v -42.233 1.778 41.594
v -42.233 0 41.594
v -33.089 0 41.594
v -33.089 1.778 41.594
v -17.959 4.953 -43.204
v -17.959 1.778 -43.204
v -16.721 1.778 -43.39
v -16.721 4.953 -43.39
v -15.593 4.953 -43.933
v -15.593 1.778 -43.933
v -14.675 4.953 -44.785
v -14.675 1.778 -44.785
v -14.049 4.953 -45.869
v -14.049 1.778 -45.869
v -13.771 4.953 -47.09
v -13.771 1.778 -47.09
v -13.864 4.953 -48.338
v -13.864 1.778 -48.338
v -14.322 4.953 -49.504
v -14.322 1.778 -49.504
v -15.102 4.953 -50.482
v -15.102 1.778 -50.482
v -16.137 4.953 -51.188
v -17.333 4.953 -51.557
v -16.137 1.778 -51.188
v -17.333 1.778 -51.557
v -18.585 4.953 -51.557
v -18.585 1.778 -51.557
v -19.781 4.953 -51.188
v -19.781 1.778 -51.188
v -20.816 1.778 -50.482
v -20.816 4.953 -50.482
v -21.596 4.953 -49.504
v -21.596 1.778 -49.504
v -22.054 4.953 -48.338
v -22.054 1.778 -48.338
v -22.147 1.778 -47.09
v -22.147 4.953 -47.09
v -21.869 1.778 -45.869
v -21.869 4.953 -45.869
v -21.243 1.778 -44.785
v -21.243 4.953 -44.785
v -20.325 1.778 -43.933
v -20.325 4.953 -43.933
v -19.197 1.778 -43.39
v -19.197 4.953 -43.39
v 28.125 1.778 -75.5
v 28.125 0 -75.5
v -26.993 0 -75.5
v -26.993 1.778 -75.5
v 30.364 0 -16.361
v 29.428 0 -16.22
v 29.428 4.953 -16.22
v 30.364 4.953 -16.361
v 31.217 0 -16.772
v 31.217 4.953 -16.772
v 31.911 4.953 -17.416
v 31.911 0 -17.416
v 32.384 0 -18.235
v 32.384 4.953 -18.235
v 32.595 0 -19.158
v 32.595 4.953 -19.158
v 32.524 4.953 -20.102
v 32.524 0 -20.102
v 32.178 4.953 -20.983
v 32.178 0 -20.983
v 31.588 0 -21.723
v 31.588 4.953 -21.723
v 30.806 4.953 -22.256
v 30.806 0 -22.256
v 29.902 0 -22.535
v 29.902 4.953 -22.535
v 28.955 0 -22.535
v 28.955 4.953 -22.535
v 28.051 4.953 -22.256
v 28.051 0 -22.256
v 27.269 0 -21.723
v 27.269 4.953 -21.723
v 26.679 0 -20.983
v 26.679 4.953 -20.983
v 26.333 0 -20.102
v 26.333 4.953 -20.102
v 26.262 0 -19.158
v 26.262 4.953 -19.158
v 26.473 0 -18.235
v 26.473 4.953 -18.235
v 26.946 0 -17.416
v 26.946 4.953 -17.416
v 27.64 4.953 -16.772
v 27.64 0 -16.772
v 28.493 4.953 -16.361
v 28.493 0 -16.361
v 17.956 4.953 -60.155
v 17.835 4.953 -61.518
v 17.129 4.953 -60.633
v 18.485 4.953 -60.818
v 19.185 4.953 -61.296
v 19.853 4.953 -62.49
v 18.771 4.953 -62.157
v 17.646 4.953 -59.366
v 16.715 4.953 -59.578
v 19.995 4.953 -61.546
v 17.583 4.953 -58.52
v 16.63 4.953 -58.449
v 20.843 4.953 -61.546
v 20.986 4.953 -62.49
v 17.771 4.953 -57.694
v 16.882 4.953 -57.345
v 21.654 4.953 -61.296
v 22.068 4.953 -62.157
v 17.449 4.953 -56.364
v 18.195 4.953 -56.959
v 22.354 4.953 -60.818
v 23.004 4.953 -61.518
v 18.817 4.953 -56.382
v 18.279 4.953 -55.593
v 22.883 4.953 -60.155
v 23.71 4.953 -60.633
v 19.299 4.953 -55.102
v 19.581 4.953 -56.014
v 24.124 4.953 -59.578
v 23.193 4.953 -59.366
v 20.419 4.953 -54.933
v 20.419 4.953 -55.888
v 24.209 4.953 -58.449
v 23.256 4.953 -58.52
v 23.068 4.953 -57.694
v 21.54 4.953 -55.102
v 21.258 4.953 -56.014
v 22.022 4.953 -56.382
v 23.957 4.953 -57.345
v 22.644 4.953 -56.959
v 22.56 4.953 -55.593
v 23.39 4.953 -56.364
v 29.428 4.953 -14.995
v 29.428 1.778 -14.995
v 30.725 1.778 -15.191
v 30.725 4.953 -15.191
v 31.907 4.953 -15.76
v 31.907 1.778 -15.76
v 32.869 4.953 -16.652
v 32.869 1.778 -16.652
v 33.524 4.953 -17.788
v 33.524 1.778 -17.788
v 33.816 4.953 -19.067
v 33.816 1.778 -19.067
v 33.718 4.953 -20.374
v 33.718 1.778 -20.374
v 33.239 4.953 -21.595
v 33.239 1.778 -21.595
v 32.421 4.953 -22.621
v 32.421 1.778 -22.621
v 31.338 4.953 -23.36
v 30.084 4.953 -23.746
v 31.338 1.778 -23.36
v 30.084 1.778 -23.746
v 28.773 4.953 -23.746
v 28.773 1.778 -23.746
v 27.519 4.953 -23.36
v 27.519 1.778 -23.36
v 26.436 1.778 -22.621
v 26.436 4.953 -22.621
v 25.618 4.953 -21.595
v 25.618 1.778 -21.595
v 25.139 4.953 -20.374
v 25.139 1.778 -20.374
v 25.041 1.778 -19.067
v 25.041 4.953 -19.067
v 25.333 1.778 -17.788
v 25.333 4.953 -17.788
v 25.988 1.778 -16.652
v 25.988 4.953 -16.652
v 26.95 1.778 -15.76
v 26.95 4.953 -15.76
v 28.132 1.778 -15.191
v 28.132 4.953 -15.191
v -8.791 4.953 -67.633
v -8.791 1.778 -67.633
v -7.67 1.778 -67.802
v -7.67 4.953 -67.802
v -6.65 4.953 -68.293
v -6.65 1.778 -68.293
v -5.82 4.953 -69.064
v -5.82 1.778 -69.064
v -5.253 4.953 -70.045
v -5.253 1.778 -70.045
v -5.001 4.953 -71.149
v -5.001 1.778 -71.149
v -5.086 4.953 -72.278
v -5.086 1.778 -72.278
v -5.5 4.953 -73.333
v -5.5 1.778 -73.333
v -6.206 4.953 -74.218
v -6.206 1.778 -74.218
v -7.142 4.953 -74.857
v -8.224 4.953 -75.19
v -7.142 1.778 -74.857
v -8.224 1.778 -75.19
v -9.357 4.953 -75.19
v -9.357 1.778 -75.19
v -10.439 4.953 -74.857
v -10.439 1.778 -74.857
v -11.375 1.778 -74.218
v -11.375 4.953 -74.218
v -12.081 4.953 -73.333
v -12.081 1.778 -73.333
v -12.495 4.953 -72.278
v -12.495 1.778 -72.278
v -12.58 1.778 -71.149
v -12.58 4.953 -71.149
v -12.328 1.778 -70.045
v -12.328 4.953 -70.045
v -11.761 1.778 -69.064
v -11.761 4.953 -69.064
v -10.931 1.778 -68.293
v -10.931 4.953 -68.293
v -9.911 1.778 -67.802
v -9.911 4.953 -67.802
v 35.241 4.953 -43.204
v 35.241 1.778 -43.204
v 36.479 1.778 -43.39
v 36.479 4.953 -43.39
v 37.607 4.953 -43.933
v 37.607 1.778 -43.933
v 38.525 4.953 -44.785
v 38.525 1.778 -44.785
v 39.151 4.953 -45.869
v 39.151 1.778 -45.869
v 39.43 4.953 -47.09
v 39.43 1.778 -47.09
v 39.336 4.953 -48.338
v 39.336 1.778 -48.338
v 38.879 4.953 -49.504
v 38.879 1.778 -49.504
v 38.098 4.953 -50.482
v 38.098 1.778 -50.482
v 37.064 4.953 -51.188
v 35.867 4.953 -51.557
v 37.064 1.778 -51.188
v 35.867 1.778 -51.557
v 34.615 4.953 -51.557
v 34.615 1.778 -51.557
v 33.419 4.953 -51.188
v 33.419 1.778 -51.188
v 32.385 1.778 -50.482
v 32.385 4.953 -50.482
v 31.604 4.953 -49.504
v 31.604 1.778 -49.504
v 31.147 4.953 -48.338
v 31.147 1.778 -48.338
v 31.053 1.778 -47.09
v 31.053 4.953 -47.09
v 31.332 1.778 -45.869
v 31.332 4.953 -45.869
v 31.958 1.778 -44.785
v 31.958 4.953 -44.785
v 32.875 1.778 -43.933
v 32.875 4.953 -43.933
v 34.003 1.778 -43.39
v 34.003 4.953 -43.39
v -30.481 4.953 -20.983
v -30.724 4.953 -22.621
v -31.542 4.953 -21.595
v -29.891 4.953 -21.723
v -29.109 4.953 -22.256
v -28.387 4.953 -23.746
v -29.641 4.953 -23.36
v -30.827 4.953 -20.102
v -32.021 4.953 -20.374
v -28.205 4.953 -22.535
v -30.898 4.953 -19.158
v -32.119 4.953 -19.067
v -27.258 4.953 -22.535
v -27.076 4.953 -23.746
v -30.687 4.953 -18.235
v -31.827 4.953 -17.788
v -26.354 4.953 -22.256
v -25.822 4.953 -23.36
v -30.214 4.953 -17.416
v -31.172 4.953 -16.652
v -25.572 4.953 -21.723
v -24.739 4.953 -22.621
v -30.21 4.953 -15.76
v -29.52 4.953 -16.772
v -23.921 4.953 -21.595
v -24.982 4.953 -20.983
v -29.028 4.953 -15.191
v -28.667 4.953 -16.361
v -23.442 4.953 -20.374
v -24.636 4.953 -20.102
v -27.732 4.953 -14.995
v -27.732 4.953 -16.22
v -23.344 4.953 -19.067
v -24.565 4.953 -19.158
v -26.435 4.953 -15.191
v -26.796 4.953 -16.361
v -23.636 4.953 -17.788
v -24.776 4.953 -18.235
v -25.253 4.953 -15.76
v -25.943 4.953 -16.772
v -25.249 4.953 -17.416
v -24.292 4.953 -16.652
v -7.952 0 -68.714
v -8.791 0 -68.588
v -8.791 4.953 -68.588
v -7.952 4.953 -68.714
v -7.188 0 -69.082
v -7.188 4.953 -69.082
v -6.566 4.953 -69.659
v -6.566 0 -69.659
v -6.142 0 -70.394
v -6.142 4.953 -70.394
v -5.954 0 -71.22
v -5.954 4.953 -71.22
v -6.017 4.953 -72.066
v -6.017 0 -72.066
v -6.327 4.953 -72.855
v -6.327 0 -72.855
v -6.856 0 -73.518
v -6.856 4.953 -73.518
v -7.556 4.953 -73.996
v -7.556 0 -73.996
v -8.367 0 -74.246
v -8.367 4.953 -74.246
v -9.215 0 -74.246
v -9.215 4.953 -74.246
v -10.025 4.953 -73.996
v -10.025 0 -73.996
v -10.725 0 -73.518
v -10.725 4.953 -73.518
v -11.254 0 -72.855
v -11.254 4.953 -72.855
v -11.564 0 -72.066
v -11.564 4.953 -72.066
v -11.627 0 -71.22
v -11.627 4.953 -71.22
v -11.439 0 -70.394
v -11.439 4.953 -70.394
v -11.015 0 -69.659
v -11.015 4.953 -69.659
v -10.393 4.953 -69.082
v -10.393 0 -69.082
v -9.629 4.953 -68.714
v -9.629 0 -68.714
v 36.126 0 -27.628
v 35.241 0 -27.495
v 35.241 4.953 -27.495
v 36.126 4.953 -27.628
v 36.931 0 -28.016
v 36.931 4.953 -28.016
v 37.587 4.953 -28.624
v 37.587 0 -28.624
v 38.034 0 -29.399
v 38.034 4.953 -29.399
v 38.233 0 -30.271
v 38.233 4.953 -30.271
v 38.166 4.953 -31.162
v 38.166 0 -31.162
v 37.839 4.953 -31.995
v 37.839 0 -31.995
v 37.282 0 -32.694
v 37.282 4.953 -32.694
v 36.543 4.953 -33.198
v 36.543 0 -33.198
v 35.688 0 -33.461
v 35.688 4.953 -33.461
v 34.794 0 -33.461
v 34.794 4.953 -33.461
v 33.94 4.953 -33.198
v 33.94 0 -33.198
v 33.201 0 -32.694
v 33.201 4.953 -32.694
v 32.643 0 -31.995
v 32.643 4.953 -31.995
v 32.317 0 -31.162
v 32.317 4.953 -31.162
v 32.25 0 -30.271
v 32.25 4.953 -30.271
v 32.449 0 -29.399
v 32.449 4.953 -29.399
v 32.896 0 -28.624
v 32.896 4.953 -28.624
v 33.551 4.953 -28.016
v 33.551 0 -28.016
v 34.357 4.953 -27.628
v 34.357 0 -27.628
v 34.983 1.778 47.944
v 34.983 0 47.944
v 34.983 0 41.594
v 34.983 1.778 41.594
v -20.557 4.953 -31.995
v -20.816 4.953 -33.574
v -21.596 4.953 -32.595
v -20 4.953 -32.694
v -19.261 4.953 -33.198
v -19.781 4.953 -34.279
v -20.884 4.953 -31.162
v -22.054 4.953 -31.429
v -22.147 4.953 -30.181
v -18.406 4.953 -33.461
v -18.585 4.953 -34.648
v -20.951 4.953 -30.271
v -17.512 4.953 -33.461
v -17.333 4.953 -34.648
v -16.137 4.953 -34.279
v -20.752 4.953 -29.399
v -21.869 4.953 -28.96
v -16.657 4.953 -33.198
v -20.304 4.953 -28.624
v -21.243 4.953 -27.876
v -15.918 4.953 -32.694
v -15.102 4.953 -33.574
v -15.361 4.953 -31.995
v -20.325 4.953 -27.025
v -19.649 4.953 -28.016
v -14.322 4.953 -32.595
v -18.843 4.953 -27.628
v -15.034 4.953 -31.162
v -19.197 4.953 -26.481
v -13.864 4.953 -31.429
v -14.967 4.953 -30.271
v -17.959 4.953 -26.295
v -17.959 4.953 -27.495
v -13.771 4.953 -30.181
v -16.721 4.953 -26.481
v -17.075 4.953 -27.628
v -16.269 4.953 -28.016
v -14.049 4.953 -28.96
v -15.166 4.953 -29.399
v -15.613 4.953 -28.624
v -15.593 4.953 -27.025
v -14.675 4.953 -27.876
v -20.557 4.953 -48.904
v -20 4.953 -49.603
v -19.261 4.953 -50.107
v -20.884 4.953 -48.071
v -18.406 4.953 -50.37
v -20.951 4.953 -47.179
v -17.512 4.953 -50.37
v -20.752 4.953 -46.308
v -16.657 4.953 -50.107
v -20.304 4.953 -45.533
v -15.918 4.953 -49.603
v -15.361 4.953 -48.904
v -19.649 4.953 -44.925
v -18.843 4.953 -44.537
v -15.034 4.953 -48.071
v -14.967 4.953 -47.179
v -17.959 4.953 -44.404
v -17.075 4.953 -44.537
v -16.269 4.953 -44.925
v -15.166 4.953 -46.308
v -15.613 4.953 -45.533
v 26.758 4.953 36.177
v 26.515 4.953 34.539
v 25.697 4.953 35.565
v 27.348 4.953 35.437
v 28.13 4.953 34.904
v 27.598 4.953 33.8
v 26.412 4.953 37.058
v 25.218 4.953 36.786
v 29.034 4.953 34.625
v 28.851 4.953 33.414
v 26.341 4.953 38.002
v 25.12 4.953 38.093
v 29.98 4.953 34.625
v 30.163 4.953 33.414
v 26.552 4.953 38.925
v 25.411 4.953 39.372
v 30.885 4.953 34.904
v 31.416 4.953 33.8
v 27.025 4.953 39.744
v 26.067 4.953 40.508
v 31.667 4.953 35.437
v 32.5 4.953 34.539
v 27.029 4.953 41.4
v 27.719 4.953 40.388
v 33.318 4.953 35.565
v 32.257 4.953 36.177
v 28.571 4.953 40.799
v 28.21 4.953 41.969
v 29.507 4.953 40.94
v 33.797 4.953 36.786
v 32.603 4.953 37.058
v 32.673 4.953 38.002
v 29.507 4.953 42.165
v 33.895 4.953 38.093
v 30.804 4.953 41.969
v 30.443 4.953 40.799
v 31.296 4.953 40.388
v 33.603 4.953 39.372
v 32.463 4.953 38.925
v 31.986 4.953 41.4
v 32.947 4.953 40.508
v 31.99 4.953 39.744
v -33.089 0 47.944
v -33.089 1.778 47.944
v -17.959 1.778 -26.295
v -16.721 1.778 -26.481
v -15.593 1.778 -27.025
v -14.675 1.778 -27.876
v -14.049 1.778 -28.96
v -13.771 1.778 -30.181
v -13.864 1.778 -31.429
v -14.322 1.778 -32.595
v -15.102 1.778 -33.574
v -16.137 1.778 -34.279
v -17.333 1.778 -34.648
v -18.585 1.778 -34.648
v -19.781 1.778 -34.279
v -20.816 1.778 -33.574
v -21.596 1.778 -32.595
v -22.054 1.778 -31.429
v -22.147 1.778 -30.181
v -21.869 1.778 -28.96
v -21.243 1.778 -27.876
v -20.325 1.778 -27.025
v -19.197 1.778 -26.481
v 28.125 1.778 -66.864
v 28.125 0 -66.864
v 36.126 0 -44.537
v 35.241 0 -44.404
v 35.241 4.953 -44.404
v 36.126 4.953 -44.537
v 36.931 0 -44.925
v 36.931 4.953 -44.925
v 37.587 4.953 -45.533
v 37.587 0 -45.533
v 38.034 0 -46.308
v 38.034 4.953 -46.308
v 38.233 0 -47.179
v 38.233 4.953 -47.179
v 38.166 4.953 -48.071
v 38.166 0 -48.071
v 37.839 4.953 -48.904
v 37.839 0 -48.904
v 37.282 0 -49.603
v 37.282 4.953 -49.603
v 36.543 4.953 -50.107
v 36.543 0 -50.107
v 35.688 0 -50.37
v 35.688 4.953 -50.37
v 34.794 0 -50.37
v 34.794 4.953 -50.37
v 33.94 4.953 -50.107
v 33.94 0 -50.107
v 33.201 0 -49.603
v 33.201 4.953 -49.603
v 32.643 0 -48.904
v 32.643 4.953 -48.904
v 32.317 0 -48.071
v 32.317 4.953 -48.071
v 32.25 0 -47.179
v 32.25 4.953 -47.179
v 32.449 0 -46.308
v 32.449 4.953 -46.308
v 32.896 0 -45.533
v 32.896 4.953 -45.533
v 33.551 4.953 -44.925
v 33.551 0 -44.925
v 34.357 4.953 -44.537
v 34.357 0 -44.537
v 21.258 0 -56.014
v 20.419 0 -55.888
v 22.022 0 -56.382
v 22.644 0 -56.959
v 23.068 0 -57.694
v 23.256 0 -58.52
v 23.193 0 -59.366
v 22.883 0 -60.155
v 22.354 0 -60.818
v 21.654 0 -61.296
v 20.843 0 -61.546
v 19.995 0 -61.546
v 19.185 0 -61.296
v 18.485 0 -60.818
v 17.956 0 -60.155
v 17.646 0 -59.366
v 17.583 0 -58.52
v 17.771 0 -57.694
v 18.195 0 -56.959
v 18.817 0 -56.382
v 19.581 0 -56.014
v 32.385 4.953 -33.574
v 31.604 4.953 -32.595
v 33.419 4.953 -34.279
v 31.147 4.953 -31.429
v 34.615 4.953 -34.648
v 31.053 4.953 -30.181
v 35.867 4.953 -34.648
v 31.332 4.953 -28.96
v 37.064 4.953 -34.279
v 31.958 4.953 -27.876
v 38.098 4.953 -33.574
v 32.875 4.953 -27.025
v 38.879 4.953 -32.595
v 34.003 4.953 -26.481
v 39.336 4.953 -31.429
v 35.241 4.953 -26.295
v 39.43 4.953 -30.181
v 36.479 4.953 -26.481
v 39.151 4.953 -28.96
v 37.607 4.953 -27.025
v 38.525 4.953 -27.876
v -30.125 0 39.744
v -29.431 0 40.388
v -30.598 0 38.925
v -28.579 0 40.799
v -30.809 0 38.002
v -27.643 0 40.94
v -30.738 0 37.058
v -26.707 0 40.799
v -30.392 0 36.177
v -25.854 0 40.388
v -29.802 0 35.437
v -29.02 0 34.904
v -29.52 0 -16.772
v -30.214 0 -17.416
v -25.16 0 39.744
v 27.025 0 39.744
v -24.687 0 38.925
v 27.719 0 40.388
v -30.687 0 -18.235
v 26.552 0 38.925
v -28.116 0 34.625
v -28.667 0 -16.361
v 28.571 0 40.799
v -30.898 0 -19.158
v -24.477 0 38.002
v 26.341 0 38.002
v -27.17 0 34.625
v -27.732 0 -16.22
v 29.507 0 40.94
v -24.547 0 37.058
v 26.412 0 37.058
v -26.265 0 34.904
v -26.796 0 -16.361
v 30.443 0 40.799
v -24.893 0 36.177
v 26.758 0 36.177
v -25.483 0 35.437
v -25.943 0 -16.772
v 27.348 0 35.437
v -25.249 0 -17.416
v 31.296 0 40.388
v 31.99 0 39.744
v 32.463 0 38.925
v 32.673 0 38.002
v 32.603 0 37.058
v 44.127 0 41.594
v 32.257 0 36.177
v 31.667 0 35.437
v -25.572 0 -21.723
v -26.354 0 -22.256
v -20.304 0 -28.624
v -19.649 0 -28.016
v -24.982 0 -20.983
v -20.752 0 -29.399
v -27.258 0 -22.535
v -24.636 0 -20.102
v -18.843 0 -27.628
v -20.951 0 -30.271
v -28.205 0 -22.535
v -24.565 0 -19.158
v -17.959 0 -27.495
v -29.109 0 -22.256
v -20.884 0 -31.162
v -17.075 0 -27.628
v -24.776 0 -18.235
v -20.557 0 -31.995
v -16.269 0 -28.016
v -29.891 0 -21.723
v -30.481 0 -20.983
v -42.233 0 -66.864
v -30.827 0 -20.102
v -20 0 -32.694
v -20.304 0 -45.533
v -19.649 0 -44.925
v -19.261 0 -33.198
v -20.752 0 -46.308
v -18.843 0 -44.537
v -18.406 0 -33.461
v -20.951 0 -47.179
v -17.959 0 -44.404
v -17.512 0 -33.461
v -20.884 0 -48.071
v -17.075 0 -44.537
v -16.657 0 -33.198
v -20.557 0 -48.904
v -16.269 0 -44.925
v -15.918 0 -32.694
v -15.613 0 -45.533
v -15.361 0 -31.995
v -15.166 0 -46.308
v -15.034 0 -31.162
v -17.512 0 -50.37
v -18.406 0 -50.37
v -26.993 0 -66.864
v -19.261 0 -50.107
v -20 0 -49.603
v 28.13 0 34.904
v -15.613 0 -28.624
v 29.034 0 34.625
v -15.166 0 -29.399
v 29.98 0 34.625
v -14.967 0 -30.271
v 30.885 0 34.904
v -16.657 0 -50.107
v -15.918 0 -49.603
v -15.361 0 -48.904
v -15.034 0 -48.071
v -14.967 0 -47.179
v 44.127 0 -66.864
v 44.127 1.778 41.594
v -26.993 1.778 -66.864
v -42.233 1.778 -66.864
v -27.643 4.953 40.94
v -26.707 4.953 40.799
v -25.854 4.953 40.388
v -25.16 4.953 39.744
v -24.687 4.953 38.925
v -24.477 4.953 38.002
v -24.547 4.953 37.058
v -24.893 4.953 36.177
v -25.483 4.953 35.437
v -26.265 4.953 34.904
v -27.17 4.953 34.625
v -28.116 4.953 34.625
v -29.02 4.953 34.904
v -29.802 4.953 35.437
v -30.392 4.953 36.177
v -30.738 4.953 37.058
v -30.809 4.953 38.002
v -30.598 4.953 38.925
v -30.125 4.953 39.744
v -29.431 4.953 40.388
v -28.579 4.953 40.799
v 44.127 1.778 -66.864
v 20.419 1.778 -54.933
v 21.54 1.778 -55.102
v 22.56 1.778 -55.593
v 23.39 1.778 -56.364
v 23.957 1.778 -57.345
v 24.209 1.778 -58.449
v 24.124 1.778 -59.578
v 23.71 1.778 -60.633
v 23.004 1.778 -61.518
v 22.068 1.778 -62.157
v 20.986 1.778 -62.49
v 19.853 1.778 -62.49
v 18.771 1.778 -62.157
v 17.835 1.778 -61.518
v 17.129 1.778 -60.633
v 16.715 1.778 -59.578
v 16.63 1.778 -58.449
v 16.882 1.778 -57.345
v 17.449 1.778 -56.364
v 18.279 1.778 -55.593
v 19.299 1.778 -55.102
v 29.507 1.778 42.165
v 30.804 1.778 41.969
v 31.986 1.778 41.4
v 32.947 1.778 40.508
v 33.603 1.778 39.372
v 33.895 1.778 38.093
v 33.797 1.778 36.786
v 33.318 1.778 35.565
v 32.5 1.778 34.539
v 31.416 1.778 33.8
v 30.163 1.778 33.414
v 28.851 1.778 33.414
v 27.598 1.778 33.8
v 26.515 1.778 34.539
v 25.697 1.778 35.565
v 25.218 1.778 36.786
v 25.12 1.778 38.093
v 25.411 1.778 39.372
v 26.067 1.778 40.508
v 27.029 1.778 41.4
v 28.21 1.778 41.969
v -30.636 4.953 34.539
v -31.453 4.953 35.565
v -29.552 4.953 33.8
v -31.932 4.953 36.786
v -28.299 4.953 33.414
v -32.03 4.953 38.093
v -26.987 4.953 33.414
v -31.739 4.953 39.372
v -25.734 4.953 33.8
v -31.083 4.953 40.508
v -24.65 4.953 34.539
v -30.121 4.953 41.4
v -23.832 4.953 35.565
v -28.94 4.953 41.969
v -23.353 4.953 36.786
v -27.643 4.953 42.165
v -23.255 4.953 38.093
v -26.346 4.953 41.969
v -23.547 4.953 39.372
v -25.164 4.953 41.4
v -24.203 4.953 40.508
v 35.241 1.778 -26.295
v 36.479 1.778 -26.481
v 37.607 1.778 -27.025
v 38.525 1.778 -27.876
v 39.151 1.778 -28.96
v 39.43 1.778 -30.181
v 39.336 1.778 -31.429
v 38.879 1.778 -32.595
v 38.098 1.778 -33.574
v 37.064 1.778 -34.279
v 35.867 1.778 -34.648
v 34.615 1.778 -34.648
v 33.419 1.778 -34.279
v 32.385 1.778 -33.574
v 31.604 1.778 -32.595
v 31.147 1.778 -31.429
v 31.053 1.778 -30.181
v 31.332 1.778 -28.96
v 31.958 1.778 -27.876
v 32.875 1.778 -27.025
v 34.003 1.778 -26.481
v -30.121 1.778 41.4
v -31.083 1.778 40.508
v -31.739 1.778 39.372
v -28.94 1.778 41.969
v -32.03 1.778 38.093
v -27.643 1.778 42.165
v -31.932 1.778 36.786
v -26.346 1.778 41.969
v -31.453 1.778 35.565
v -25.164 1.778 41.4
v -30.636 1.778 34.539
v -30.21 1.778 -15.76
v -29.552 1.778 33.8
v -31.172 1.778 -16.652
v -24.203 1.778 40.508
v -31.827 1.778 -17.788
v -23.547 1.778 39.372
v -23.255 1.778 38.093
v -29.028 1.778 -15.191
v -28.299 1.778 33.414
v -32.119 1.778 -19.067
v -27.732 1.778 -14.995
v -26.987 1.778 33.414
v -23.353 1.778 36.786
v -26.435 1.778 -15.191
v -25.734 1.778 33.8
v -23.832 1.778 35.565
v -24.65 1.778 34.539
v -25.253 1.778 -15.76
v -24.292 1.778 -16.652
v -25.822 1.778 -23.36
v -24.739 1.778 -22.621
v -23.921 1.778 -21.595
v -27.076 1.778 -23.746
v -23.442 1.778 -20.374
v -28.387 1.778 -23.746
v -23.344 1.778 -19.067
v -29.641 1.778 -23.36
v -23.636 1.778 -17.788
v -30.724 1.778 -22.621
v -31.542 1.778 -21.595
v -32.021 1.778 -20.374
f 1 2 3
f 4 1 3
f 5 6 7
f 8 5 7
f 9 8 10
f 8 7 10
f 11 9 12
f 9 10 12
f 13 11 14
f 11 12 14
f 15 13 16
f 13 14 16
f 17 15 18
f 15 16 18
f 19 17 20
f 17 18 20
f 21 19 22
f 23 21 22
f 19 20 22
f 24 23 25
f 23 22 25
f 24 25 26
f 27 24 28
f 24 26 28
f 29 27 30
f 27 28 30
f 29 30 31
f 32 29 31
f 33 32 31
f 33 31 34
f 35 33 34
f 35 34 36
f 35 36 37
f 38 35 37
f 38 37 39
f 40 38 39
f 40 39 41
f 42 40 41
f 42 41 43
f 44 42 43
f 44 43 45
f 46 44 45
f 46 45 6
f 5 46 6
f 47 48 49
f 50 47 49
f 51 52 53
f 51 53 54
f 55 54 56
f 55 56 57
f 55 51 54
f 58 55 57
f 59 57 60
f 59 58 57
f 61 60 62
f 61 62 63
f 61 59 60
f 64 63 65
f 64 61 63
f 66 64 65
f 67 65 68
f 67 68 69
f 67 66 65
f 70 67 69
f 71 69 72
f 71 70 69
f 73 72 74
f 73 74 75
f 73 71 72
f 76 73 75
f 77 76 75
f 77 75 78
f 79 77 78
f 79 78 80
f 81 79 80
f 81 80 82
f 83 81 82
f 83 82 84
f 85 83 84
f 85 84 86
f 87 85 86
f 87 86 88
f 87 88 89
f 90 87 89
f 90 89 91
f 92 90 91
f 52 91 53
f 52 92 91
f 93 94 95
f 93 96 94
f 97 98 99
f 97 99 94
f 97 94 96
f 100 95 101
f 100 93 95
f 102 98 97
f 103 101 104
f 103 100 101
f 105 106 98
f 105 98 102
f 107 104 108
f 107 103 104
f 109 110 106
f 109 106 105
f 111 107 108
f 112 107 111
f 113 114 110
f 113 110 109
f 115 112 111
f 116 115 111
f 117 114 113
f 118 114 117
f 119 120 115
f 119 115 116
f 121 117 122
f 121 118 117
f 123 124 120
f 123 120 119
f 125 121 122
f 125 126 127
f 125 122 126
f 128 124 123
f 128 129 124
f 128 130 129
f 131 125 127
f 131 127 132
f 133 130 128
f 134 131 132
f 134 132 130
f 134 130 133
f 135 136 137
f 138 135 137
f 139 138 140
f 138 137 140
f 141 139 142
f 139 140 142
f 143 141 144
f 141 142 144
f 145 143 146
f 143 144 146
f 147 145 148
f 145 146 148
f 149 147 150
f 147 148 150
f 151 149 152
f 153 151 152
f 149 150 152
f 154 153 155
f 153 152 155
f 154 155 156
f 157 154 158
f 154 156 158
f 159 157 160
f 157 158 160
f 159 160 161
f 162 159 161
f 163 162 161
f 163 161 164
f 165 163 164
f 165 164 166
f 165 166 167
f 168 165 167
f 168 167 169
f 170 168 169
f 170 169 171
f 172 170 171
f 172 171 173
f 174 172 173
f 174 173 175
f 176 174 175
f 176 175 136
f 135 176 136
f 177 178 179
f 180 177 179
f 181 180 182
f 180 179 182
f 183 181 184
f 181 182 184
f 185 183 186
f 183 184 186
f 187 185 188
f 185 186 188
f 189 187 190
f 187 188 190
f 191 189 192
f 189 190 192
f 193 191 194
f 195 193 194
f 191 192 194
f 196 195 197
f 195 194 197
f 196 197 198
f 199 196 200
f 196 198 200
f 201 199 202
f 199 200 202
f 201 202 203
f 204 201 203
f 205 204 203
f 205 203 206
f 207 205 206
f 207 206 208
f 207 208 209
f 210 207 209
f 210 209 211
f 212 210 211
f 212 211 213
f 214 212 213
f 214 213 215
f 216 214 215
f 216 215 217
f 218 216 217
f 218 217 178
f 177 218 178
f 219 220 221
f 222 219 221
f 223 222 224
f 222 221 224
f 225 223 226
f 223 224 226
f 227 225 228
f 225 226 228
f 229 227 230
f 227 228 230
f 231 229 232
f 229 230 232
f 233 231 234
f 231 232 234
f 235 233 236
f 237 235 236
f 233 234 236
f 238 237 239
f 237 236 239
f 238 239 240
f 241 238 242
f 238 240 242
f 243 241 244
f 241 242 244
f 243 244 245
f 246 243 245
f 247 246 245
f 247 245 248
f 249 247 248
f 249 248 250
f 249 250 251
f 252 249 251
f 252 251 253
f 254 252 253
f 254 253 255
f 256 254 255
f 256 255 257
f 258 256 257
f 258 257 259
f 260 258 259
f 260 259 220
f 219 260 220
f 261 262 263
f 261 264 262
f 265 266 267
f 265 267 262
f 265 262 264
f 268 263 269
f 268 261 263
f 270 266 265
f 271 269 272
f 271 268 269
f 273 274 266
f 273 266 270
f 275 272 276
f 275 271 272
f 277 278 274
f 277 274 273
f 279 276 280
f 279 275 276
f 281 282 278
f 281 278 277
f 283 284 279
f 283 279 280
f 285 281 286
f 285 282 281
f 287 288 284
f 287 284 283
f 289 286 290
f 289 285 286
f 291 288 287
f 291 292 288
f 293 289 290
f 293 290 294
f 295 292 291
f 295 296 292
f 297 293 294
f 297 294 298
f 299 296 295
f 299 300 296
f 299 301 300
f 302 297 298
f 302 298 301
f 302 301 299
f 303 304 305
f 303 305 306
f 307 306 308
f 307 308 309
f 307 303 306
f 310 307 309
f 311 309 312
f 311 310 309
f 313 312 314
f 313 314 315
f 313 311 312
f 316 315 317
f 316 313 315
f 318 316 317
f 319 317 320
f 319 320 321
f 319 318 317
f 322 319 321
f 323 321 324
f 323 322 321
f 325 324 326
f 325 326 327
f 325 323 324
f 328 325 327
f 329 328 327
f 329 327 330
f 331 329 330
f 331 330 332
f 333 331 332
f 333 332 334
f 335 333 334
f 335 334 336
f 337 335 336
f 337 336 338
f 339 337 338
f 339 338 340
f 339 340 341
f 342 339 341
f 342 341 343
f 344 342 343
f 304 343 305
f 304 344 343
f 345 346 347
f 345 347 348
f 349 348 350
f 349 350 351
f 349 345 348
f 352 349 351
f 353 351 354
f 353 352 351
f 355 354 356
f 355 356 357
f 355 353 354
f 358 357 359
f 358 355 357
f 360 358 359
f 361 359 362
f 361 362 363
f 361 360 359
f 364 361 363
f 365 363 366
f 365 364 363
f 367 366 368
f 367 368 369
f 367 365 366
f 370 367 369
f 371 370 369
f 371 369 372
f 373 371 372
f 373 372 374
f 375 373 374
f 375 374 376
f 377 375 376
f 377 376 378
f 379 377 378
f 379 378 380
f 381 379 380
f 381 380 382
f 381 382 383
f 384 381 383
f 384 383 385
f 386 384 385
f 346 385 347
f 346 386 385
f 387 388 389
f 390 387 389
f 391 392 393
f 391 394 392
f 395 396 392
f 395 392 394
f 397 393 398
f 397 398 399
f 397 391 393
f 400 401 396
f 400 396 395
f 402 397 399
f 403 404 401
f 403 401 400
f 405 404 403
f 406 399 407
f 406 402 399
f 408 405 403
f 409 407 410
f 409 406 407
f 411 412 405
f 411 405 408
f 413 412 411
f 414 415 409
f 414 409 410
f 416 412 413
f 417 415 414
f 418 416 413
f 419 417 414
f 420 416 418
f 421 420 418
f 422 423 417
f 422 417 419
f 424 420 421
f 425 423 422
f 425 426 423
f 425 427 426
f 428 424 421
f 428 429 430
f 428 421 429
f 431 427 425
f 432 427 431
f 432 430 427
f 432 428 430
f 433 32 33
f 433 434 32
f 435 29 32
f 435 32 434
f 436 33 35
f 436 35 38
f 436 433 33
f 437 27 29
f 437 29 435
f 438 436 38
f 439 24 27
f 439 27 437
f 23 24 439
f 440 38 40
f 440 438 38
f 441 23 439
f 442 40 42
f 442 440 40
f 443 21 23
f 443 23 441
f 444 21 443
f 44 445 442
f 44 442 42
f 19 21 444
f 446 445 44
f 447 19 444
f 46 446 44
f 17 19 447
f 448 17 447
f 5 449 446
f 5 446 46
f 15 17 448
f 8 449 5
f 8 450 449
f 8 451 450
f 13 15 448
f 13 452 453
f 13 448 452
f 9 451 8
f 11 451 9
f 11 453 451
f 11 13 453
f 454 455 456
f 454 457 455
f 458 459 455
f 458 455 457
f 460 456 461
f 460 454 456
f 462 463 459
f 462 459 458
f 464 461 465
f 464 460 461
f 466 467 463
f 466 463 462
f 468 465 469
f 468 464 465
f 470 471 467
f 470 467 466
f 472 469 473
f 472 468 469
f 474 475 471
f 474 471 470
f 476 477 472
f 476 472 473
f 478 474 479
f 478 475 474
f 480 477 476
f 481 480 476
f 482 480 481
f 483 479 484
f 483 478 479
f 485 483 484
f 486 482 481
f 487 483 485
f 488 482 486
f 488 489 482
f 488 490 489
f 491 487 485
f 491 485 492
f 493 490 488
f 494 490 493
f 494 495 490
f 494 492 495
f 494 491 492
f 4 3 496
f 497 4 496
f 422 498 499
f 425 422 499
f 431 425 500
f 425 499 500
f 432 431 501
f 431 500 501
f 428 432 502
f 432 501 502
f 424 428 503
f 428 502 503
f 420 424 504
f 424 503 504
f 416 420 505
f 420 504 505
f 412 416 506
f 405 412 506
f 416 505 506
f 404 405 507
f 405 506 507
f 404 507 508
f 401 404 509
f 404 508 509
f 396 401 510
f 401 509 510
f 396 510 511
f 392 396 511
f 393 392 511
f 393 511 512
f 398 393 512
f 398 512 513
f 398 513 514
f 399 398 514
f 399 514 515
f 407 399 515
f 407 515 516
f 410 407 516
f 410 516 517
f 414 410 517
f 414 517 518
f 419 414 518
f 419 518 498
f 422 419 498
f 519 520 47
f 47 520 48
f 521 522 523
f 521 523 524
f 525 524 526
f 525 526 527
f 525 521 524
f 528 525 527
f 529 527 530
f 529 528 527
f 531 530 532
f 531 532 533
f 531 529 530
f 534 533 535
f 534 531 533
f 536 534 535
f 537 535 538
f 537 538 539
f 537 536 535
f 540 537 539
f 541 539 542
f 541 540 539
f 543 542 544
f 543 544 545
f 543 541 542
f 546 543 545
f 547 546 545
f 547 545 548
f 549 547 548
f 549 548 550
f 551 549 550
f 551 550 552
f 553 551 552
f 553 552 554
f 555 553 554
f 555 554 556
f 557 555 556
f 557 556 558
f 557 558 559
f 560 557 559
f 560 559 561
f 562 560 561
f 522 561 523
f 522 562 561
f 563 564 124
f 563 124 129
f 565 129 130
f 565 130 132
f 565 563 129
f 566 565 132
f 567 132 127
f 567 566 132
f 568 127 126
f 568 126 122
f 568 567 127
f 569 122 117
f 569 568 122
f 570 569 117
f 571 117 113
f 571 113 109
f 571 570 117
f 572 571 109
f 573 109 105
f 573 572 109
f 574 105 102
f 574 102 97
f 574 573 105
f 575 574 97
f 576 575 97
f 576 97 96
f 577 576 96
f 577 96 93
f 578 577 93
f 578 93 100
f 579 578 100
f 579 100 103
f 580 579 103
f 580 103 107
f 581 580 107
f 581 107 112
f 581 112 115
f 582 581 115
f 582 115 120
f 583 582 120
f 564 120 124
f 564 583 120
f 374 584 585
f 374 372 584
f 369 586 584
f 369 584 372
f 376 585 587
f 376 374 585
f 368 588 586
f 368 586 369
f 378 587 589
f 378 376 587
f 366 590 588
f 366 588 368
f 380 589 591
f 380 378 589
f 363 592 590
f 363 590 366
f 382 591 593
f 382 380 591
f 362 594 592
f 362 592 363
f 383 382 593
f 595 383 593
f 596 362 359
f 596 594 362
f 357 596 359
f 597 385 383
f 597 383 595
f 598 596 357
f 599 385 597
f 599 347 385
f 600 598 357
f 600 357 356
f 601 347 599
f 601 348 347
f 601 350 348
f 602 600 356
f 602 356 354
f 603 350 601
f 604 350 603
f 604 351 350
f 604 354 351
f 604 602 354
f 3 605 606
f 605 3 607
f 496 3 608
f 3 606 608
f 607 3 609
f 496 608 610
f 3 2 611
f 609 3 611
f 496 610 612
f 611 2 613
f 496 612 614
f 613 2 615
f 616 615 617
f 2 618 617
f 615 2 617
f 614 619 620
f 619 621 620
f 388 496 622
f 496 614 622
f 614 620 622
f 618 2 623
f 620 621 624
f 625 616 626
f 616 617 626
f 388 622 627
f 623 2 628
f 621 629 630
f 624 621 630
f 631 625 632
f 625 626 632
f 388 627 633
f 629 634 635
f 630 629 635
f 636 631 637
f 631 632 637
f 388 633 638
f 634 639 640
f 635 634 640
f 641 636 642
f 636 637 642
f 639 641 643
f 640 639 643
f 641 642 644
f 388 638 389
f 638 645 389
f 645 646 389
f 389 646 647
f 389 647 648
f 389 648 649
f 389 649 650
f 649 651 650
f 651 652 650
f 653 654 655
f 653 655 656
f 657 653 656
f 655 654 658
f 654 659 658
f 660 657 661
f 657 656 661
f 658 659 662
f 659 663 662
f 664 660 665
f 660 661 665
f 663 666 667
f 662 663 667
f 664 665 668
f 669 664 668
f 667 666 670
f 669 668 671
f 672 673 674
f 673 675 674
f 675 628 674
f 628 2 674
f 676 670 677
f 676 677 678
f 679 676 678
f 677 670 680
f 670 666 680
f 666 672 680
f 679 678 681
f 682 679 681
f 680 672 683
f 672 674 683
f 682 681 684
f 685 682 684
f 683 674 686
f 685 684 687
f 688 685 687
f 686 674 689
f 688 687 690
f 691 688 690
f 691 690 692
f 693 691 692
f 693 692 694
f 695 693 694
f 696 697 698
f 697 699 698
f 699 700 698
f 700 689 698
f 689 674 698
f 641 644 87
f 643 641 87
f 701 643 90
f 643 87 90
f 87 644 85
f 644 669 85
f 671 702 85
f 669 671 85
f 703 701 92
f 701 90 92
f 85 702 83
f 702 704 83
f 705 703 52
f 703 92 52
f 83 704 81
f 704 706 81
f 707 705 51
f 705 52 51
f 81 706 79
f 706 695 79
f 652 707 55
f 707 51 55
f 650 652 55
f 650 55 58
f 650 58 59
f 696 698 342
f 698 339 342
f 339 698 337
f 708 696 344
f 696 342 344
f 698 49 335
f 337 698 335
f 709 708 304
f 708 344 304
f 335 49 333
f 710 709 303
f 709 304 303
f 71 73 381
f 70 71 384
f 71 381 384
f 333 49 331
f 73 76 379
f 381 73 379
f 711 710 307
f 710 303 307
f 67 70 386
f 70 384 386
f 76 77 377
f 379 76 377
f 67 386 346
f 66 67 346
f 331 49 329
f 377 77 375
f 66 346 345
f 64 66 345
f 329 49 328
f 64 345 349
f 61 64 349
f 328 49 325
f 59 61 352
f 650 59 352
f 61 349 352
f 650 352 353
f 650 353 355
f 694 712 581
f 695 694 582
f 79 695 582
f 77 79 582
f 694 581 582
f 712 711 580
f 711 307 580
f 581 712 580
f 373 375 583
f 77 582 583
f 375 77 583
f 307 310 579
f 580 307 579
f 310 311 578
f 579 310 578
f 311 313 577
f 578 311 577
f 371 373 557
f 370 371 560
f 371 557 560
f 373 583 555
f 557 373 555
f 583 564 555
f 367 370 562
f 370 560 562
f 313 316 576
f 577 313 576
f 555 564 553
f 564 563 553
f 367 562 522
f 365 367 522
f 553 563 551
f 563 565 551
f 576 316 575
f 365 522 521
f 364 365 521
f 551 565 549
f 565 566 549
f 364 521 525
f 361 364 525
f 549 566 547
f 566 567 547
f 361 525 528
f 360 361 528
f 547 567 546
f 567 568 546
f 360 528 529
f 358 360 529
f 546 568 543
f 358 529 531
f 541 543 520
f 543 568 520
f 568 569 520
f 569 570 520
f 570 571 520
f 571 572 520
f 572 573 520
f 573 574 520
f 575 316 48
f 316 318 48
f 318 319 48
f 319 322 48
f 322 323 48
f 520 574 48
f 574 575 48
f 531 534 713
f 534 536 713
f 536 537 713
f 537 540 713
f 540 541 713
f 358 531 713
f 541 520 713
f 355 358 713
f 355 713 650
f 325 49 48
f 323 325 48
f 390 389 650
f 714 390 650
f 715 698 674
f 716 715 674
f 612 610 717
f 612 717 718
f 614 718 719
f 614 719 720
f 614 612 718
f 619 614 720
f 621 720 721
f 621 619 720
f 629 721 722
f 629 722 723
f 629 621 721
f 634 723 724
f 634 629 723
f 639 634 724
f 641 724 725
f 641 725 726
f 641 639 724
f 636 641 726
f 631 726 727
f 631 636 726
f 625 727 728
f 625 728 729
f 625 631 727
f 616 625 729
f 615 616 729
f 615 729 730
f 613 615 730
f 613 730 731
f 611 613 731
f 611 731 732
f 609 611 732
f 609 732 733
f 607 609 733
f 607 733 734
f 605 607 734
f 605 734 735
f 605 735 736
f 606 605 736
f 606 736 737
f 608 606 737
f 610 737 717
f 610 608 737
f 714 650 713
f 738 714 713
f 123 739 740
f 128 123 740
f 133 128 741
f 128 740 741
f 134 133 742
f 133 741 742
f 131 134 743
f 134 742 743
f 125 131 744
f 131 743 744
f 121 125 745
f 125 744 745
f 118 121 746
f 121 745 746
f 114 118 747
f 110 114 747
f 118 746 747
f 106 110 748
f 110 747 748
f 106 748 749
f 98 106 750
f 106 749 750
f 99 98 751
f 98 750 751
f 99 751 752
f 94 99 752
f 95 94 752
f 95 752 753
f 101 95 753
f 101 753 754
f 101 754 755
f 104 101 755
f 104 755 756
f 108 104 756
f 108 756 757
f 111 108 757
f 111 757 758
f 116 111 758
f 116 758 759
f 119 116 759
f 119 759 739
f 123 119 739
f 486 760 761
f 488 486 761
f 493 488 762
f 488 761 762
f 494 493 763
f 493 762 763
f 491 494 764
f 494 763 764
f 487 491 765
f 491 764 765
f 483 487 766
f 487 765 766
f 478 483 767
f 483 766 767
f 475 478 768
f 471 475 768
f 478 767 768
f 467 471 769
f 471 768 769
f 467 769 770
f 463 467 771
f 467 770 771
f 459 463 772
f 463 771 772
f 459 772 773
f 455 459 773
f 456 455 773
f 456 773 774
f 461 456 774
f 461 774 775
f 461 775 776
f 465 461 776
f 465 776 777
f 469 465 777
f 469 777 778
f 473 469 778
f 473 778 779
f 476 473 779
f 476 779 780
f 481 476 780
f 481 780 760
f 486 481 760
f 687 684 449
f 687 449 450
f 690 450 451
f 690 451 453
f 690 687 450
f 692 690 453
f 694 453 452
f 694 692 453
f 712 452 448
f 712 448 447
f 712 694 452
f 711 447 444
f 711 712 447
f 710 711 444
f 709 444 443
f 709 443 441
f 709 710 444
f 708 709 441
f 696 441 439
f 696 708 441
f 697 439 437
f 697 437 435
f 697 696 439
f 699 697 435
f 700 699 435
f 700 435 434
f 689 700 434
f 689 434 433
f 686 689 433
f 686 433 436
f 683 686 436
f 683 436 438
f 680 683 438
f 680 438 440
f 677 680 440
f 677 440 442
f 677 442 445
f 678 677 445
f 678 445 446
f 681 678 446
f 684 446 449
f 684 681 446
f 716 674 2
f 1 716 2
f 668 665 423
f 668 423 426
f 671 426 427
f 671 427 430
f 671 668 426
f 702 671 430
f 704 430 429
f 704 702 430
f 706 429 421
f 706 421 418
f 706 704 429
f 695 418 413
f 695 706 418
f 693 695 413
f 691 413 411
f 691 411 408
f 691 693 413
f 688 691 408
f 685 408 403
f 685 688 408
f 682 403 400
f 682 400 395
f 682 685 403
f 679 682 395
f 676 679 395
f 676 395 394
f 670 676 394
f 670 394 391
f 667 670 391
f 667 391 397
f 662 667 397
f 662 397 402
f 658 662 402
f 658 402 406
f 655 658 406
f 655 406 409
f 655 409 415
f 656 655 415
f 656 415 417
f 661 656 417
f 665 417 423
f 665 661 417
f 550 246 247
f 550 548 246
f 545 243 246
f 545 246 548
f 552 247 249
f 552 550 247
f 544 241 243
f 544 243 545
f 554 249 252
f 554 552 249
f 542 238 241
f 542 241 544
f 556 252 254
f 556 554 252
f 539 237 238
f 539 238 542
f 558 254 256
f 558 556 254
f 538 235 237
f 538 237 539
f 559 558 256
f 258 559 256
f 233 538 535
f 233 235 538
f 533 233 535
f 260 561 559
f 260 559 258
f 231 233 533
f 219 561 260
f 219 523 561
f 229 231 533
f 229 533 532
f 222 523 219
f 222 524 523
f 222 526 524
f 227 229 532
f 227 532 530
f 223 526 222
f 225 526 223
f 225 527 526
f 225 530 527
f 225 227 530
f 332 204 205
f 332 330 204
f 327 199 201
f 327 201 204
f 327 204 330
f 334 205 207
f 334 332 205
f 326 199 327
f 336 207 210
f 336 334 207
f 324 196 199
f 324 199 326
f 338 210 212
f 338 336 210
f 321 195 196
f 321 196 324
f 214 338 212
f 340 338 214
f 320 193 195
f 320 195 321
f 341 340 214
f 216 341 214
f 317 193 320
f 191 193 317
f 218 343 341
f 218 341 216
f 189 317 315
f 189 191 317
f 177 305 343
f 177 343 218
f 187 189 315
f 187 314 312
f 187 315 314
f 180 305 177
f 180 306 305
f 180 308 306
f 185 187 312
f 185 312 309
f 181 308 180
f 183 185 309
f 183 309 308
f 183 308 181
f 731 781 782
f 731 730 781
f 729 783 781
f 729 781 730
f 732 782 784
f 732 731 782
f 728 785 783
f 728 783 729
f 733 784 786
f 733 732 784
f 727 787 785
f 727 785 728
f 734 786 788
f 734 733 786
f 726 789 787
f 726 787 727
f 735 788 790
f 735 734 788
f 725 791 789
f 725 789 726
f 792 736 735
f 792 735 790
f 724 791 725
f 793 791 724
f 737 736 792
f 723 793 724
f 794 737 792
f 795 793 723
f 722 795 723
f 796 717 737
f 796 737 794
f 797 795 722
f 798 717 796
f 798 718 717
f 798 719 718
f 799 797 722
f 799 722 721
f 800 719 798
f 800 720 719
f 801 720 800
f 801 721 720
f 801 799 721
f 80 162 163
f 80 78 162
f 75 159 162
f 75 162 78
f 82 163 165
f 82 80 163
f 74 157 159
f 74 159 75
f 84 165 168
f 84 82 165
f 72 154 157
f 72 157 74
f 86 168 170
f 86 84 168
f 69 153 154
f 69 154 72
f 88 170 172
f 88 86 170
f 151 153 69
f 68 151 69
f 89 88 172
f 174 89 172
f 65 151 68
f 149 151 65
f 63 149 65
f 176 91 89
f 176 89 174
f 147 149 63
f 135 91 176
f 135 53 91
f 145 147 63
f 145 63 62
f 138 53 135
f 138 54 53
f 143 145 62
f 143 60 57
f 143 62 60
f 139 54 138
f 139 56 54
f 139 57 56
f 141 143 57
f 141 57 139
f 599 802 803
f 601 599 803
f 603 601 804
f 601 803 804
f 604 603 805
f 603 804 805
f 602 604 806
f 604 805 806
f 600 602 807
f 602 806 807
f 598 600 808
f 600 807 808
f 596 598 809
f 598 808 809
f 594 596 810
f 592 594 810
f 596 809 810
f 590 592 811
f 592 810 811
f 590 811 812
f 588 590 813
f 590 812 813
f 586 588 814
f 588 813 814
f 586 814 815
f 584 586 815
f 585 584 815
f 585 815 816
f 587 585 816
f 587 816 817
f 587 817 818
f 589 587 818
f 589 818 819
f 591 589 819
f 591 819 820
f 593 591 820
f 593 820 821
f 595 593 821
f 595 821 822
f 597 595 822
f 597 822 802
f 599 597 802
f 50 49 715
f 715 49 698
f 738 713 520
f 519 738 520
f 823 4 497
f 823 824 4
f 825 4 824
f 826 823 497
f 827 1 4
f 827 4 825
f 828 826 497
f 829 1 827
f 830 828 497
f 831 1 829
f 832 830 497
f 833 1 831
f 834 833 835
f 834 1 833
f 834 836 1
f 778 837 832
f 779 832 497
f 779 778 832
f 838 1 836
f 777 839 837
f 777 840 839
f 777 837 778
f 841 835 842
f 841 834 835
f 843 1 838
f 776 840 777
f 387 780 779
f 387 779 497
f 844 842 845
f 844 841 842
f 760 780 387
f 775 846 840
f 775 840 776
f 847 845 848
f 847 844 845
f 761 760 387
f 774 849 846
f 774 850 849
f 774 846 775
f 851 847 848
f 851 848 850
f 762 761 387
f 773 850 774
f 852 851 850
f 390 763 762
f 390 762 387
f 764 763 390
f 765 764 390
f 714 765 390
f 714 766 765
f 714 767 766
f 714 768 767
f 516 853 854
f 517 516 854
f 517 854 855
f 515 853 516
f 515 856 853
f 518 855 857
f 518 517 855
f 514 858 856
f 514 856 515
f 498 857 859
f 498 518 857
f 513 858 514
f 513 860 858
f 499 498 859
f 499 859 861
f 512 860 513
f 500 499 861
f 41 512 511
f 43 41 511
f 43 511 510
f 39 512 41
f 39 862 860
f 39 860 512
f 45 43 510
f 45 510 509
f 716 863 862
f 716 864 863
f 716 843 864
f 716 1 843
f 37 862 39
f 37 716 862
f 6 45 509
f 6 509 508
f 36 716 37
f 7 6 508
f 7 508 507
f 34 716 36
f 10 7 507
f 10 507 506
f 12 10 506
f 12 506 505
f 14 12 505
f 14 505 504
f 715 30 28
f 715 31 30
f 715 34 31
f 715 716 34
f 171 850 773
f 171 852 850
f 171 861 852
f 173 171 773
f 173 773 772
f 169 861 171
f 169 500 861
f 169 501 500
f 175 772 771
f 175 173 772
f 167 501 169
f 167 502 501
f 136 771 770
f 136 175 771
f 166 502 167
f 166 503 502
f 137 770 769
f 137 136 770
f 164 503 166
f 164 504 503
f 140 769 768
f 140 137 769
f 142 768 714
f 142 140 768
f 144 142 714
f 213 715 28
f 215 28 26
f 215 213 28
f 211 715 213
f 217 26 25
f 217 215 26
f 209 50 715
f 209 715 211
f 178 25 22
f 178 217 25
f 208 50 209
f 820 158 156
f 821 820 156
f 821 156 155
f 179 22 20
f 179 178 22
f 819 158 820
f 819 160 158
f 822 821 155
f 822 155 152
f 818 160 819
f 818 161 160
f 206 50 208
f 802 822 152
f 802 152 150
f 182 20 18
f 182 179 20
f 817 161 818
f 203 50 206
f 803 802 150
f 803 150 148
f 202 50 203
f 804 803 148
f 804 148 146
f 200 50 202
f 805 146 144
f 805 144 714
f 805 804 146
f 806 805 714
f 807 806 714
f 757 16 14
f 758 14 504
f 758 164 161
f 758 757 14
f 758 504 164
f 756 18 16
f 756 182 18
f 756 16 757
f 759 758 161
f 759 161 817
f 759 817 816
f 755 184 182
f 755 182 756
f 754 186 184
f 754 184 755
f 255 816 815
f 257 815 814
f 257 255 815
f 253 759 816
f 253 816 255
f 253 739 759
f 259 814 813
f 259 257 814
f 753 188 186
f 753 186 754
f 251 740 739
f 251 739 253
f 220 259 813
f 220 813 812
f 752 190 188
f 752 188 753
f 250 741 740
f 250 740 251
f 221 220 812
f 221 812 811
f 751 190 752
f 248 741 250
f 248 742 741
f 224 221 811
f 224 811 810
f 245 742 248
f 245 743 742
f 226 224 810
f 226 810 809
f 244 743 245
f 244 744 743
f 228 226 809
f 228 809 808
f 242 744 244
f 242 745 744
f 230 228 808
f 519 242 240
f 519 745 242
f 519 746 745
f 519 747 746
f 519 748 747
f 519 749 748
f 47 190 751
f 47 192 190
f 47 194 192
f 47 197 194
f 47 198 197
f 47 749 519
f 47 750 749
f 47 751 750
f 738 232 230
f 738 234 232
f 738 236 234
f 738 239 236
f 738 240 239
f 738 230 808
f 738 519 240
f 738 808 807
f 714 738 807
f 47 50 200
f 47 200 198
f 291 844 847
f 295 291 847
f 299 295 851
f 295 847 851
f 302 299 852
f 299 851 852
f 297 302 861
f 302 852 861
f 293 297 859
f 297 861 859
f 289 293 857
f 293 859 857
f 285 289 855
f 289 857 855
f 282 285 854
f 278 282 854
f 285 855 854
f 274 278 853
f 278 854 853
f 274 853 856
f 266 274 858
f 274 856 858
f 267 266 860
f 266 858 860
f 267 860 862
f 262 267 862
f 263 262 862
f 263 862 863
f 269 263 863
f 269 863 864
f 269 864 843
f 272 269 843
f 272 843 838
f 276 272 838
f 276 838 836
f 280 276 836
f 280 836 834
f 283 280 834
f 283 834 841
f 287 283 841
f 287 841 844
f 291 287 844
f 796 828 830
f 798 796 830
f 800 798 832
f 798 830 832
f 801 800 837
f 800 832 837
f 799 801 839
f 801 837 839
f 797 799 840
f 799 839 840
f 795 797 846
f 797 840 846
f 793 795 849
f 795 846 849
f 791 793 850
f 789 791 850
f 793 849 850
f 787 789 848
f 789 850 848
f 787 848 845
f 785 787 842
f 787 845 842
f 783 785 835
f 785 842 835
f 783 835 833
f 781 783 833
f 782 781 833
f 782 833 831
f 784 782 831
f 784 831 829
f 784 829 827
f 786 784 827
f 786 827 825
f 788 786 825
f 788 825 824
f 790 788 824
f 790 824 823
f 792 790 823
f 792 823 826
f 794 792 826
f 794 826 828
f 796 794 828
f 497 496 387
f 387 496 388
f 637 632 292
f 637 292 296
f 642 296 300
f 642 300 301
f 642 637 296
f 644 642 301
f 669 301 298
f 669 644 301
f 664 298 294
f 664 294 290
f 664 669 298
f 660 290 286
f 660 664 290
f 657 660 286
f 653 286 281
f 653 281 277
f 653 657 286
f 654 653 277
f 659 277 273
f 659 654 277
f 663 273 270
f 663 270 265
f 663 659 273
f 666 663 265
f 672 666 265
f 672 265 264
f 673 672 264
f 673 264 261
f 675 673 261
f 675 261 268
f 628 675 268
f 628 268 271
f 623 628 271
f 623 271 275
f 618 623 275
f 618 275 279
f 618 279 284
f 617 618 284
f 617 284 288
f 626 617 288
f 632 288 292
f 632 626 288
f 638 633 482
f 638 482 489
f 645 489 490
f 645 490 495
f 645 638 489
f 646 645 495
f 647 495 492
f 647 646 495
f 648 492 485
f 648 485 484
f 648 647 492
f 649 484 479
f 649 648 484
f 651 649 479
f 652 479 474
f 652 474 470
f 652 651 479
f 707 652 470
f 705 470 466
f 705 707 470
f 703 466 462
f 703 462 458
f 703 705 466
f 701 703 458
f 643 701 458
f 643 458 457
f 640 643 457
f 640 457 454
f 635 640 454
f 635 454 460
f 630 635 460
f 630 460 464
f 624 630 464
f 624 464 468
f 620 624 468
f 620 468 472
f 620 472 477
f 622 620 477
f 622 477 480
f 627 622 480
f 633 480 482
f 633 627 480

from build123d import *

# Parameters (mm, degrees)
SKETCH1_R           = 4.4
SKETCH1_R_2         = 4.2
SKETCH1_R_3         = 3.8
BOSS_EXTRUDE2_DEPTH = 1.778
SKETCH1_4_R         = 4.2
SKETCH1_4_R_2       = 3
SKETCH1_4_R_3       = 4.4
SKETCH1_4_R_4       = 3.175
SKETCH1_4_R_5       = 3.8
SKETCH1_4_R_6       = 2.8448
BOSS_EXTRUDE3_DEPTH = 4.953


with BuildPart() as part:
    # Sketch1 → Boss-Extrude2 (new body)
    with BuildSketch(Plane(origin=(0, 0, 0), x_dir=(1, 0, 0), z_dir=(0, 1, 0))):
        Polygon((-42.232830982, -41.594410903), (-33.088830982, -41.594410903), (-33.088830982, -47.944410903), (34.983169018, -47.944410903), (34.983169018, -41.594410903), (44.127169018, -41.594410903), (44.127169018, 66.863589097), (43.365169018, 66.863589097), (28.125169018, 66.863589097), (28.125169018, 75.499589097), (-26.992830982, 75.499589097), (-26.992830982, 66.863589097), (-42.232830982, 66.863589097), align=None)
        with Locations(Location((-27.642783289, -37.764613693, 0), (0, 0, 270))):
            Circle(SKETCH1_R, mode=Mode.SUBTRACT)
        with Locations(Location((29.507278107, -37.764613693, 0), (0, 0, 270))):
            Circle(SKETCH1_R, mode=Mode.SUBTRACT)
        with Locations(Location((-27.731568772, 19.395386307, 0), (0, 0, 270))):
            Circle(SKETCH1_R, mode=Mode.SUBTRACT)
        with Locations(Location((-17.958983642, 30.494821479, 0), (0, 0, 270))):
            Circle(SKETCH1_R_2, mode=Mode.SUBTRACT)
        with Locations(Location((-17.958983642, 47.403601479, 0), (0, 0, 270))):
            Circle(SKETCH1_R_2, mode=Mode.SUBTRACT)
        with Locations(Location((-8.7905296, 71.432825816, 0), (0, 0, 270))):
            Circle(SKETCH1_R_3, mode=Mode.SUBTRACT)
        with Locations(Location((29.428492634, 19.395386307, 0), (0, 0, 270))):
            Circle(SKETCH1_R, mode=Mode.SUBTRACT)
        with Locations(Location((35.241316358, 30.494821479, 0), (0, 0, 270))):
            Circle(SKETCH1_R_2, mode=Mode.SUBTRACT)
        with Locations(Location((20.4194704, 58.732825816, 0), (0, 0, 270))):
            Circle(SKETCH1_R_3, mode=Mode.SUBTRACT)
        with Locations(Location((35.241316358, 47.403601479, 0), (0, 0, 270))):
            Circle(SKETCH1_R_2, mode=Mode.SUBTRACT)
    extrude(amount=BOSS_EXTRUDE2_DEPTH)

    # Sketch1<4> → Boss-Extrude3 (add)
    # profile 1 of 10: a face of its own
    with BuildSketch(Plane(origin=(0, 0, 0), x_dir=(1, 0, 0), z_dir=(0, 1, 0))):
        with Locations(Location((-17.958983642, 47.403601479, 0), (0, 0, 270))):
            Circle(SKETCH1_4_R)
        with Locations(Location((-17.958983642, 47.403601479, 0), (0, 0, 270))):
            Circle(SKETCH1_4_R_2, mode=Mode.SUBTRACT)
    # profile 2 of 10: a face of its own
    with BuildSketch(Plane(origin=(0, 0, 0), x_dir=(1, 0, 0), z_dir=(0, 1, 0))):
        with Locations(Location((-17.958983642, 30.494821479, 0), (0, 0, 270))):
            Circle(SKETCH1_4_R)
        with Locations(Location((-17.958983642, 30.494821479, 0), (0, 0, 270))):
            Circle(SKETCH1_4_R_2, mode=Mode.SUBTRACT)
    # profile 3 of 10: a face of its own
    with BuildSketch(Plane(origin=(0, 0, 0), x_dir=(1, 0, 0), z_dir=(0, 1, 0))):
        with Locations(Location((35.241316358, 47.403601479, 0), (0, 0, 270))):
            Circle(SKETCH1_4_R)
        with Locations(Location((35.241316358, 47.403601479, 0), (0, 0, 270))):
            Circle(SKETCH1_4_R_2, mode=Mode.SUBTRACT)
    # profile 4 of 10: a face of its own
    with BuildSketch(Plane(origin=(0, 0, 0), x_dir=(1, 0, 0), z_dir=(0, 1, 0))):
        with Locations(Location((35.241316358, 30.494821479, 0), (0, 0, 270))):
            Circle(SKETCH1_4_R)
        with Locations(Location((35.241316358, 30.494821479, 0), (0, 0, 270))):
            Circle(SKETCH1_4_R_2, mode=Mode.SUBTRACT)
    # profile 5 of 10: a face of its own
    with BuildSketch(Plane(origin=(0, 0, 0), x_dir=(1, 0, 0), z_dir=(0, 1, 0))):
        with Locations(Location((-27.731568772, 19.395386307, 0), (0, 0, 270))):
            Circle(SKETCH1_4_R_3)
        with Locations(Location((-27.731568772, 19.395386307, 0), (0, 0, 270))):
            Circle(SKETCH1_4_R_4, mode=Mode.SUBTRACT)
    # profile 6 of 10: a face of its own
    with BuildSketch(Plane(origin=(0, 0, 0), x_dir=(1, 0, 0), z_dir=(0, 1, 0))):
        with Locations(Location((-27.642783289, -37.764613693, 0), (0, 0, 270))):
            Circle(SKETCH1_4_R_3)
        with Locations(Location((-27.642783289, -37.764613693, 0), (0, 0, 270))):
            Circle(SKETCH1_4_R_4, mode=Mode.SUBTRACT)
    # profile 7 of 10: a face of its own
    with BuildSketch(Plane(origin=(0, 0, 0), x_dir=(1, 0, 0), z_dir=(0, 1, 0))):
        with Locations(Location((29.507278107, -37.764613693, 0), (0, 0, 270))):
            Circle(SKETCH1_4_R_3)
        with Locations(Location((29.507278107, -37.764613693, 0), (0, 0, 270))):
            Circle(SKETCH1_4_R_4, mode=Mode.SUBTRACT)
    # profile 8 of 10: a face of its own
    with BuildSketch(Plane(origin=(0, 0, 0), x_dir=(1, 0, 0), z_dir=(0, 1, 0))):
        with Locations(Location((29.428492634, 19.395386307, 0), (0, 0, 270))):
            Circle(SKETCH1_4_R_3)
        with Locations(Location((29.428492634, 19.395386307, 0), (0, 0, 270))):
            Circle(SKETCH1_4_R_4, mode=Mode.SUBTRACT)
    # profile 9 of 10: a face of its own
    with BuildSketch(Plane(origin=(0, 0, 0), x_dir=(1, 0, 0), z_dir=(0, 1, 0))):
        with Locations(Location((-8.7905296, 71.432825816, 0), (0, 0, 270))):
            Circle(SKETCH1_4_R_5)
        with Locations(Location((-8.7905296, 71.432825816, 0), (0, 0, 270))):
            Circle(SKETCH1_4_R_6, mode=Mode.SUBTRACT)
    # profile 10 of 10: a face of its own
    with BuildSketch(Plane(origin=(0, 0, 0), x_dir=(1, 0, 0), z_dir=(0, 1, 0))):
        with Locations(Location((20.4194704, 58.732825816, 0), (0, 0, 270))):
            Circle(SKETCH1_4_R_5)
        with Locations(Location((20.4194704, 58.732825816, 0), (0, 0, 270))):
            Circle(SKETCH1_4_R_6, mode=Mode.SUBTRACT)
    extrude(amount=BOSS_EXTRUDE3_DEPTH)


solid = part.part
